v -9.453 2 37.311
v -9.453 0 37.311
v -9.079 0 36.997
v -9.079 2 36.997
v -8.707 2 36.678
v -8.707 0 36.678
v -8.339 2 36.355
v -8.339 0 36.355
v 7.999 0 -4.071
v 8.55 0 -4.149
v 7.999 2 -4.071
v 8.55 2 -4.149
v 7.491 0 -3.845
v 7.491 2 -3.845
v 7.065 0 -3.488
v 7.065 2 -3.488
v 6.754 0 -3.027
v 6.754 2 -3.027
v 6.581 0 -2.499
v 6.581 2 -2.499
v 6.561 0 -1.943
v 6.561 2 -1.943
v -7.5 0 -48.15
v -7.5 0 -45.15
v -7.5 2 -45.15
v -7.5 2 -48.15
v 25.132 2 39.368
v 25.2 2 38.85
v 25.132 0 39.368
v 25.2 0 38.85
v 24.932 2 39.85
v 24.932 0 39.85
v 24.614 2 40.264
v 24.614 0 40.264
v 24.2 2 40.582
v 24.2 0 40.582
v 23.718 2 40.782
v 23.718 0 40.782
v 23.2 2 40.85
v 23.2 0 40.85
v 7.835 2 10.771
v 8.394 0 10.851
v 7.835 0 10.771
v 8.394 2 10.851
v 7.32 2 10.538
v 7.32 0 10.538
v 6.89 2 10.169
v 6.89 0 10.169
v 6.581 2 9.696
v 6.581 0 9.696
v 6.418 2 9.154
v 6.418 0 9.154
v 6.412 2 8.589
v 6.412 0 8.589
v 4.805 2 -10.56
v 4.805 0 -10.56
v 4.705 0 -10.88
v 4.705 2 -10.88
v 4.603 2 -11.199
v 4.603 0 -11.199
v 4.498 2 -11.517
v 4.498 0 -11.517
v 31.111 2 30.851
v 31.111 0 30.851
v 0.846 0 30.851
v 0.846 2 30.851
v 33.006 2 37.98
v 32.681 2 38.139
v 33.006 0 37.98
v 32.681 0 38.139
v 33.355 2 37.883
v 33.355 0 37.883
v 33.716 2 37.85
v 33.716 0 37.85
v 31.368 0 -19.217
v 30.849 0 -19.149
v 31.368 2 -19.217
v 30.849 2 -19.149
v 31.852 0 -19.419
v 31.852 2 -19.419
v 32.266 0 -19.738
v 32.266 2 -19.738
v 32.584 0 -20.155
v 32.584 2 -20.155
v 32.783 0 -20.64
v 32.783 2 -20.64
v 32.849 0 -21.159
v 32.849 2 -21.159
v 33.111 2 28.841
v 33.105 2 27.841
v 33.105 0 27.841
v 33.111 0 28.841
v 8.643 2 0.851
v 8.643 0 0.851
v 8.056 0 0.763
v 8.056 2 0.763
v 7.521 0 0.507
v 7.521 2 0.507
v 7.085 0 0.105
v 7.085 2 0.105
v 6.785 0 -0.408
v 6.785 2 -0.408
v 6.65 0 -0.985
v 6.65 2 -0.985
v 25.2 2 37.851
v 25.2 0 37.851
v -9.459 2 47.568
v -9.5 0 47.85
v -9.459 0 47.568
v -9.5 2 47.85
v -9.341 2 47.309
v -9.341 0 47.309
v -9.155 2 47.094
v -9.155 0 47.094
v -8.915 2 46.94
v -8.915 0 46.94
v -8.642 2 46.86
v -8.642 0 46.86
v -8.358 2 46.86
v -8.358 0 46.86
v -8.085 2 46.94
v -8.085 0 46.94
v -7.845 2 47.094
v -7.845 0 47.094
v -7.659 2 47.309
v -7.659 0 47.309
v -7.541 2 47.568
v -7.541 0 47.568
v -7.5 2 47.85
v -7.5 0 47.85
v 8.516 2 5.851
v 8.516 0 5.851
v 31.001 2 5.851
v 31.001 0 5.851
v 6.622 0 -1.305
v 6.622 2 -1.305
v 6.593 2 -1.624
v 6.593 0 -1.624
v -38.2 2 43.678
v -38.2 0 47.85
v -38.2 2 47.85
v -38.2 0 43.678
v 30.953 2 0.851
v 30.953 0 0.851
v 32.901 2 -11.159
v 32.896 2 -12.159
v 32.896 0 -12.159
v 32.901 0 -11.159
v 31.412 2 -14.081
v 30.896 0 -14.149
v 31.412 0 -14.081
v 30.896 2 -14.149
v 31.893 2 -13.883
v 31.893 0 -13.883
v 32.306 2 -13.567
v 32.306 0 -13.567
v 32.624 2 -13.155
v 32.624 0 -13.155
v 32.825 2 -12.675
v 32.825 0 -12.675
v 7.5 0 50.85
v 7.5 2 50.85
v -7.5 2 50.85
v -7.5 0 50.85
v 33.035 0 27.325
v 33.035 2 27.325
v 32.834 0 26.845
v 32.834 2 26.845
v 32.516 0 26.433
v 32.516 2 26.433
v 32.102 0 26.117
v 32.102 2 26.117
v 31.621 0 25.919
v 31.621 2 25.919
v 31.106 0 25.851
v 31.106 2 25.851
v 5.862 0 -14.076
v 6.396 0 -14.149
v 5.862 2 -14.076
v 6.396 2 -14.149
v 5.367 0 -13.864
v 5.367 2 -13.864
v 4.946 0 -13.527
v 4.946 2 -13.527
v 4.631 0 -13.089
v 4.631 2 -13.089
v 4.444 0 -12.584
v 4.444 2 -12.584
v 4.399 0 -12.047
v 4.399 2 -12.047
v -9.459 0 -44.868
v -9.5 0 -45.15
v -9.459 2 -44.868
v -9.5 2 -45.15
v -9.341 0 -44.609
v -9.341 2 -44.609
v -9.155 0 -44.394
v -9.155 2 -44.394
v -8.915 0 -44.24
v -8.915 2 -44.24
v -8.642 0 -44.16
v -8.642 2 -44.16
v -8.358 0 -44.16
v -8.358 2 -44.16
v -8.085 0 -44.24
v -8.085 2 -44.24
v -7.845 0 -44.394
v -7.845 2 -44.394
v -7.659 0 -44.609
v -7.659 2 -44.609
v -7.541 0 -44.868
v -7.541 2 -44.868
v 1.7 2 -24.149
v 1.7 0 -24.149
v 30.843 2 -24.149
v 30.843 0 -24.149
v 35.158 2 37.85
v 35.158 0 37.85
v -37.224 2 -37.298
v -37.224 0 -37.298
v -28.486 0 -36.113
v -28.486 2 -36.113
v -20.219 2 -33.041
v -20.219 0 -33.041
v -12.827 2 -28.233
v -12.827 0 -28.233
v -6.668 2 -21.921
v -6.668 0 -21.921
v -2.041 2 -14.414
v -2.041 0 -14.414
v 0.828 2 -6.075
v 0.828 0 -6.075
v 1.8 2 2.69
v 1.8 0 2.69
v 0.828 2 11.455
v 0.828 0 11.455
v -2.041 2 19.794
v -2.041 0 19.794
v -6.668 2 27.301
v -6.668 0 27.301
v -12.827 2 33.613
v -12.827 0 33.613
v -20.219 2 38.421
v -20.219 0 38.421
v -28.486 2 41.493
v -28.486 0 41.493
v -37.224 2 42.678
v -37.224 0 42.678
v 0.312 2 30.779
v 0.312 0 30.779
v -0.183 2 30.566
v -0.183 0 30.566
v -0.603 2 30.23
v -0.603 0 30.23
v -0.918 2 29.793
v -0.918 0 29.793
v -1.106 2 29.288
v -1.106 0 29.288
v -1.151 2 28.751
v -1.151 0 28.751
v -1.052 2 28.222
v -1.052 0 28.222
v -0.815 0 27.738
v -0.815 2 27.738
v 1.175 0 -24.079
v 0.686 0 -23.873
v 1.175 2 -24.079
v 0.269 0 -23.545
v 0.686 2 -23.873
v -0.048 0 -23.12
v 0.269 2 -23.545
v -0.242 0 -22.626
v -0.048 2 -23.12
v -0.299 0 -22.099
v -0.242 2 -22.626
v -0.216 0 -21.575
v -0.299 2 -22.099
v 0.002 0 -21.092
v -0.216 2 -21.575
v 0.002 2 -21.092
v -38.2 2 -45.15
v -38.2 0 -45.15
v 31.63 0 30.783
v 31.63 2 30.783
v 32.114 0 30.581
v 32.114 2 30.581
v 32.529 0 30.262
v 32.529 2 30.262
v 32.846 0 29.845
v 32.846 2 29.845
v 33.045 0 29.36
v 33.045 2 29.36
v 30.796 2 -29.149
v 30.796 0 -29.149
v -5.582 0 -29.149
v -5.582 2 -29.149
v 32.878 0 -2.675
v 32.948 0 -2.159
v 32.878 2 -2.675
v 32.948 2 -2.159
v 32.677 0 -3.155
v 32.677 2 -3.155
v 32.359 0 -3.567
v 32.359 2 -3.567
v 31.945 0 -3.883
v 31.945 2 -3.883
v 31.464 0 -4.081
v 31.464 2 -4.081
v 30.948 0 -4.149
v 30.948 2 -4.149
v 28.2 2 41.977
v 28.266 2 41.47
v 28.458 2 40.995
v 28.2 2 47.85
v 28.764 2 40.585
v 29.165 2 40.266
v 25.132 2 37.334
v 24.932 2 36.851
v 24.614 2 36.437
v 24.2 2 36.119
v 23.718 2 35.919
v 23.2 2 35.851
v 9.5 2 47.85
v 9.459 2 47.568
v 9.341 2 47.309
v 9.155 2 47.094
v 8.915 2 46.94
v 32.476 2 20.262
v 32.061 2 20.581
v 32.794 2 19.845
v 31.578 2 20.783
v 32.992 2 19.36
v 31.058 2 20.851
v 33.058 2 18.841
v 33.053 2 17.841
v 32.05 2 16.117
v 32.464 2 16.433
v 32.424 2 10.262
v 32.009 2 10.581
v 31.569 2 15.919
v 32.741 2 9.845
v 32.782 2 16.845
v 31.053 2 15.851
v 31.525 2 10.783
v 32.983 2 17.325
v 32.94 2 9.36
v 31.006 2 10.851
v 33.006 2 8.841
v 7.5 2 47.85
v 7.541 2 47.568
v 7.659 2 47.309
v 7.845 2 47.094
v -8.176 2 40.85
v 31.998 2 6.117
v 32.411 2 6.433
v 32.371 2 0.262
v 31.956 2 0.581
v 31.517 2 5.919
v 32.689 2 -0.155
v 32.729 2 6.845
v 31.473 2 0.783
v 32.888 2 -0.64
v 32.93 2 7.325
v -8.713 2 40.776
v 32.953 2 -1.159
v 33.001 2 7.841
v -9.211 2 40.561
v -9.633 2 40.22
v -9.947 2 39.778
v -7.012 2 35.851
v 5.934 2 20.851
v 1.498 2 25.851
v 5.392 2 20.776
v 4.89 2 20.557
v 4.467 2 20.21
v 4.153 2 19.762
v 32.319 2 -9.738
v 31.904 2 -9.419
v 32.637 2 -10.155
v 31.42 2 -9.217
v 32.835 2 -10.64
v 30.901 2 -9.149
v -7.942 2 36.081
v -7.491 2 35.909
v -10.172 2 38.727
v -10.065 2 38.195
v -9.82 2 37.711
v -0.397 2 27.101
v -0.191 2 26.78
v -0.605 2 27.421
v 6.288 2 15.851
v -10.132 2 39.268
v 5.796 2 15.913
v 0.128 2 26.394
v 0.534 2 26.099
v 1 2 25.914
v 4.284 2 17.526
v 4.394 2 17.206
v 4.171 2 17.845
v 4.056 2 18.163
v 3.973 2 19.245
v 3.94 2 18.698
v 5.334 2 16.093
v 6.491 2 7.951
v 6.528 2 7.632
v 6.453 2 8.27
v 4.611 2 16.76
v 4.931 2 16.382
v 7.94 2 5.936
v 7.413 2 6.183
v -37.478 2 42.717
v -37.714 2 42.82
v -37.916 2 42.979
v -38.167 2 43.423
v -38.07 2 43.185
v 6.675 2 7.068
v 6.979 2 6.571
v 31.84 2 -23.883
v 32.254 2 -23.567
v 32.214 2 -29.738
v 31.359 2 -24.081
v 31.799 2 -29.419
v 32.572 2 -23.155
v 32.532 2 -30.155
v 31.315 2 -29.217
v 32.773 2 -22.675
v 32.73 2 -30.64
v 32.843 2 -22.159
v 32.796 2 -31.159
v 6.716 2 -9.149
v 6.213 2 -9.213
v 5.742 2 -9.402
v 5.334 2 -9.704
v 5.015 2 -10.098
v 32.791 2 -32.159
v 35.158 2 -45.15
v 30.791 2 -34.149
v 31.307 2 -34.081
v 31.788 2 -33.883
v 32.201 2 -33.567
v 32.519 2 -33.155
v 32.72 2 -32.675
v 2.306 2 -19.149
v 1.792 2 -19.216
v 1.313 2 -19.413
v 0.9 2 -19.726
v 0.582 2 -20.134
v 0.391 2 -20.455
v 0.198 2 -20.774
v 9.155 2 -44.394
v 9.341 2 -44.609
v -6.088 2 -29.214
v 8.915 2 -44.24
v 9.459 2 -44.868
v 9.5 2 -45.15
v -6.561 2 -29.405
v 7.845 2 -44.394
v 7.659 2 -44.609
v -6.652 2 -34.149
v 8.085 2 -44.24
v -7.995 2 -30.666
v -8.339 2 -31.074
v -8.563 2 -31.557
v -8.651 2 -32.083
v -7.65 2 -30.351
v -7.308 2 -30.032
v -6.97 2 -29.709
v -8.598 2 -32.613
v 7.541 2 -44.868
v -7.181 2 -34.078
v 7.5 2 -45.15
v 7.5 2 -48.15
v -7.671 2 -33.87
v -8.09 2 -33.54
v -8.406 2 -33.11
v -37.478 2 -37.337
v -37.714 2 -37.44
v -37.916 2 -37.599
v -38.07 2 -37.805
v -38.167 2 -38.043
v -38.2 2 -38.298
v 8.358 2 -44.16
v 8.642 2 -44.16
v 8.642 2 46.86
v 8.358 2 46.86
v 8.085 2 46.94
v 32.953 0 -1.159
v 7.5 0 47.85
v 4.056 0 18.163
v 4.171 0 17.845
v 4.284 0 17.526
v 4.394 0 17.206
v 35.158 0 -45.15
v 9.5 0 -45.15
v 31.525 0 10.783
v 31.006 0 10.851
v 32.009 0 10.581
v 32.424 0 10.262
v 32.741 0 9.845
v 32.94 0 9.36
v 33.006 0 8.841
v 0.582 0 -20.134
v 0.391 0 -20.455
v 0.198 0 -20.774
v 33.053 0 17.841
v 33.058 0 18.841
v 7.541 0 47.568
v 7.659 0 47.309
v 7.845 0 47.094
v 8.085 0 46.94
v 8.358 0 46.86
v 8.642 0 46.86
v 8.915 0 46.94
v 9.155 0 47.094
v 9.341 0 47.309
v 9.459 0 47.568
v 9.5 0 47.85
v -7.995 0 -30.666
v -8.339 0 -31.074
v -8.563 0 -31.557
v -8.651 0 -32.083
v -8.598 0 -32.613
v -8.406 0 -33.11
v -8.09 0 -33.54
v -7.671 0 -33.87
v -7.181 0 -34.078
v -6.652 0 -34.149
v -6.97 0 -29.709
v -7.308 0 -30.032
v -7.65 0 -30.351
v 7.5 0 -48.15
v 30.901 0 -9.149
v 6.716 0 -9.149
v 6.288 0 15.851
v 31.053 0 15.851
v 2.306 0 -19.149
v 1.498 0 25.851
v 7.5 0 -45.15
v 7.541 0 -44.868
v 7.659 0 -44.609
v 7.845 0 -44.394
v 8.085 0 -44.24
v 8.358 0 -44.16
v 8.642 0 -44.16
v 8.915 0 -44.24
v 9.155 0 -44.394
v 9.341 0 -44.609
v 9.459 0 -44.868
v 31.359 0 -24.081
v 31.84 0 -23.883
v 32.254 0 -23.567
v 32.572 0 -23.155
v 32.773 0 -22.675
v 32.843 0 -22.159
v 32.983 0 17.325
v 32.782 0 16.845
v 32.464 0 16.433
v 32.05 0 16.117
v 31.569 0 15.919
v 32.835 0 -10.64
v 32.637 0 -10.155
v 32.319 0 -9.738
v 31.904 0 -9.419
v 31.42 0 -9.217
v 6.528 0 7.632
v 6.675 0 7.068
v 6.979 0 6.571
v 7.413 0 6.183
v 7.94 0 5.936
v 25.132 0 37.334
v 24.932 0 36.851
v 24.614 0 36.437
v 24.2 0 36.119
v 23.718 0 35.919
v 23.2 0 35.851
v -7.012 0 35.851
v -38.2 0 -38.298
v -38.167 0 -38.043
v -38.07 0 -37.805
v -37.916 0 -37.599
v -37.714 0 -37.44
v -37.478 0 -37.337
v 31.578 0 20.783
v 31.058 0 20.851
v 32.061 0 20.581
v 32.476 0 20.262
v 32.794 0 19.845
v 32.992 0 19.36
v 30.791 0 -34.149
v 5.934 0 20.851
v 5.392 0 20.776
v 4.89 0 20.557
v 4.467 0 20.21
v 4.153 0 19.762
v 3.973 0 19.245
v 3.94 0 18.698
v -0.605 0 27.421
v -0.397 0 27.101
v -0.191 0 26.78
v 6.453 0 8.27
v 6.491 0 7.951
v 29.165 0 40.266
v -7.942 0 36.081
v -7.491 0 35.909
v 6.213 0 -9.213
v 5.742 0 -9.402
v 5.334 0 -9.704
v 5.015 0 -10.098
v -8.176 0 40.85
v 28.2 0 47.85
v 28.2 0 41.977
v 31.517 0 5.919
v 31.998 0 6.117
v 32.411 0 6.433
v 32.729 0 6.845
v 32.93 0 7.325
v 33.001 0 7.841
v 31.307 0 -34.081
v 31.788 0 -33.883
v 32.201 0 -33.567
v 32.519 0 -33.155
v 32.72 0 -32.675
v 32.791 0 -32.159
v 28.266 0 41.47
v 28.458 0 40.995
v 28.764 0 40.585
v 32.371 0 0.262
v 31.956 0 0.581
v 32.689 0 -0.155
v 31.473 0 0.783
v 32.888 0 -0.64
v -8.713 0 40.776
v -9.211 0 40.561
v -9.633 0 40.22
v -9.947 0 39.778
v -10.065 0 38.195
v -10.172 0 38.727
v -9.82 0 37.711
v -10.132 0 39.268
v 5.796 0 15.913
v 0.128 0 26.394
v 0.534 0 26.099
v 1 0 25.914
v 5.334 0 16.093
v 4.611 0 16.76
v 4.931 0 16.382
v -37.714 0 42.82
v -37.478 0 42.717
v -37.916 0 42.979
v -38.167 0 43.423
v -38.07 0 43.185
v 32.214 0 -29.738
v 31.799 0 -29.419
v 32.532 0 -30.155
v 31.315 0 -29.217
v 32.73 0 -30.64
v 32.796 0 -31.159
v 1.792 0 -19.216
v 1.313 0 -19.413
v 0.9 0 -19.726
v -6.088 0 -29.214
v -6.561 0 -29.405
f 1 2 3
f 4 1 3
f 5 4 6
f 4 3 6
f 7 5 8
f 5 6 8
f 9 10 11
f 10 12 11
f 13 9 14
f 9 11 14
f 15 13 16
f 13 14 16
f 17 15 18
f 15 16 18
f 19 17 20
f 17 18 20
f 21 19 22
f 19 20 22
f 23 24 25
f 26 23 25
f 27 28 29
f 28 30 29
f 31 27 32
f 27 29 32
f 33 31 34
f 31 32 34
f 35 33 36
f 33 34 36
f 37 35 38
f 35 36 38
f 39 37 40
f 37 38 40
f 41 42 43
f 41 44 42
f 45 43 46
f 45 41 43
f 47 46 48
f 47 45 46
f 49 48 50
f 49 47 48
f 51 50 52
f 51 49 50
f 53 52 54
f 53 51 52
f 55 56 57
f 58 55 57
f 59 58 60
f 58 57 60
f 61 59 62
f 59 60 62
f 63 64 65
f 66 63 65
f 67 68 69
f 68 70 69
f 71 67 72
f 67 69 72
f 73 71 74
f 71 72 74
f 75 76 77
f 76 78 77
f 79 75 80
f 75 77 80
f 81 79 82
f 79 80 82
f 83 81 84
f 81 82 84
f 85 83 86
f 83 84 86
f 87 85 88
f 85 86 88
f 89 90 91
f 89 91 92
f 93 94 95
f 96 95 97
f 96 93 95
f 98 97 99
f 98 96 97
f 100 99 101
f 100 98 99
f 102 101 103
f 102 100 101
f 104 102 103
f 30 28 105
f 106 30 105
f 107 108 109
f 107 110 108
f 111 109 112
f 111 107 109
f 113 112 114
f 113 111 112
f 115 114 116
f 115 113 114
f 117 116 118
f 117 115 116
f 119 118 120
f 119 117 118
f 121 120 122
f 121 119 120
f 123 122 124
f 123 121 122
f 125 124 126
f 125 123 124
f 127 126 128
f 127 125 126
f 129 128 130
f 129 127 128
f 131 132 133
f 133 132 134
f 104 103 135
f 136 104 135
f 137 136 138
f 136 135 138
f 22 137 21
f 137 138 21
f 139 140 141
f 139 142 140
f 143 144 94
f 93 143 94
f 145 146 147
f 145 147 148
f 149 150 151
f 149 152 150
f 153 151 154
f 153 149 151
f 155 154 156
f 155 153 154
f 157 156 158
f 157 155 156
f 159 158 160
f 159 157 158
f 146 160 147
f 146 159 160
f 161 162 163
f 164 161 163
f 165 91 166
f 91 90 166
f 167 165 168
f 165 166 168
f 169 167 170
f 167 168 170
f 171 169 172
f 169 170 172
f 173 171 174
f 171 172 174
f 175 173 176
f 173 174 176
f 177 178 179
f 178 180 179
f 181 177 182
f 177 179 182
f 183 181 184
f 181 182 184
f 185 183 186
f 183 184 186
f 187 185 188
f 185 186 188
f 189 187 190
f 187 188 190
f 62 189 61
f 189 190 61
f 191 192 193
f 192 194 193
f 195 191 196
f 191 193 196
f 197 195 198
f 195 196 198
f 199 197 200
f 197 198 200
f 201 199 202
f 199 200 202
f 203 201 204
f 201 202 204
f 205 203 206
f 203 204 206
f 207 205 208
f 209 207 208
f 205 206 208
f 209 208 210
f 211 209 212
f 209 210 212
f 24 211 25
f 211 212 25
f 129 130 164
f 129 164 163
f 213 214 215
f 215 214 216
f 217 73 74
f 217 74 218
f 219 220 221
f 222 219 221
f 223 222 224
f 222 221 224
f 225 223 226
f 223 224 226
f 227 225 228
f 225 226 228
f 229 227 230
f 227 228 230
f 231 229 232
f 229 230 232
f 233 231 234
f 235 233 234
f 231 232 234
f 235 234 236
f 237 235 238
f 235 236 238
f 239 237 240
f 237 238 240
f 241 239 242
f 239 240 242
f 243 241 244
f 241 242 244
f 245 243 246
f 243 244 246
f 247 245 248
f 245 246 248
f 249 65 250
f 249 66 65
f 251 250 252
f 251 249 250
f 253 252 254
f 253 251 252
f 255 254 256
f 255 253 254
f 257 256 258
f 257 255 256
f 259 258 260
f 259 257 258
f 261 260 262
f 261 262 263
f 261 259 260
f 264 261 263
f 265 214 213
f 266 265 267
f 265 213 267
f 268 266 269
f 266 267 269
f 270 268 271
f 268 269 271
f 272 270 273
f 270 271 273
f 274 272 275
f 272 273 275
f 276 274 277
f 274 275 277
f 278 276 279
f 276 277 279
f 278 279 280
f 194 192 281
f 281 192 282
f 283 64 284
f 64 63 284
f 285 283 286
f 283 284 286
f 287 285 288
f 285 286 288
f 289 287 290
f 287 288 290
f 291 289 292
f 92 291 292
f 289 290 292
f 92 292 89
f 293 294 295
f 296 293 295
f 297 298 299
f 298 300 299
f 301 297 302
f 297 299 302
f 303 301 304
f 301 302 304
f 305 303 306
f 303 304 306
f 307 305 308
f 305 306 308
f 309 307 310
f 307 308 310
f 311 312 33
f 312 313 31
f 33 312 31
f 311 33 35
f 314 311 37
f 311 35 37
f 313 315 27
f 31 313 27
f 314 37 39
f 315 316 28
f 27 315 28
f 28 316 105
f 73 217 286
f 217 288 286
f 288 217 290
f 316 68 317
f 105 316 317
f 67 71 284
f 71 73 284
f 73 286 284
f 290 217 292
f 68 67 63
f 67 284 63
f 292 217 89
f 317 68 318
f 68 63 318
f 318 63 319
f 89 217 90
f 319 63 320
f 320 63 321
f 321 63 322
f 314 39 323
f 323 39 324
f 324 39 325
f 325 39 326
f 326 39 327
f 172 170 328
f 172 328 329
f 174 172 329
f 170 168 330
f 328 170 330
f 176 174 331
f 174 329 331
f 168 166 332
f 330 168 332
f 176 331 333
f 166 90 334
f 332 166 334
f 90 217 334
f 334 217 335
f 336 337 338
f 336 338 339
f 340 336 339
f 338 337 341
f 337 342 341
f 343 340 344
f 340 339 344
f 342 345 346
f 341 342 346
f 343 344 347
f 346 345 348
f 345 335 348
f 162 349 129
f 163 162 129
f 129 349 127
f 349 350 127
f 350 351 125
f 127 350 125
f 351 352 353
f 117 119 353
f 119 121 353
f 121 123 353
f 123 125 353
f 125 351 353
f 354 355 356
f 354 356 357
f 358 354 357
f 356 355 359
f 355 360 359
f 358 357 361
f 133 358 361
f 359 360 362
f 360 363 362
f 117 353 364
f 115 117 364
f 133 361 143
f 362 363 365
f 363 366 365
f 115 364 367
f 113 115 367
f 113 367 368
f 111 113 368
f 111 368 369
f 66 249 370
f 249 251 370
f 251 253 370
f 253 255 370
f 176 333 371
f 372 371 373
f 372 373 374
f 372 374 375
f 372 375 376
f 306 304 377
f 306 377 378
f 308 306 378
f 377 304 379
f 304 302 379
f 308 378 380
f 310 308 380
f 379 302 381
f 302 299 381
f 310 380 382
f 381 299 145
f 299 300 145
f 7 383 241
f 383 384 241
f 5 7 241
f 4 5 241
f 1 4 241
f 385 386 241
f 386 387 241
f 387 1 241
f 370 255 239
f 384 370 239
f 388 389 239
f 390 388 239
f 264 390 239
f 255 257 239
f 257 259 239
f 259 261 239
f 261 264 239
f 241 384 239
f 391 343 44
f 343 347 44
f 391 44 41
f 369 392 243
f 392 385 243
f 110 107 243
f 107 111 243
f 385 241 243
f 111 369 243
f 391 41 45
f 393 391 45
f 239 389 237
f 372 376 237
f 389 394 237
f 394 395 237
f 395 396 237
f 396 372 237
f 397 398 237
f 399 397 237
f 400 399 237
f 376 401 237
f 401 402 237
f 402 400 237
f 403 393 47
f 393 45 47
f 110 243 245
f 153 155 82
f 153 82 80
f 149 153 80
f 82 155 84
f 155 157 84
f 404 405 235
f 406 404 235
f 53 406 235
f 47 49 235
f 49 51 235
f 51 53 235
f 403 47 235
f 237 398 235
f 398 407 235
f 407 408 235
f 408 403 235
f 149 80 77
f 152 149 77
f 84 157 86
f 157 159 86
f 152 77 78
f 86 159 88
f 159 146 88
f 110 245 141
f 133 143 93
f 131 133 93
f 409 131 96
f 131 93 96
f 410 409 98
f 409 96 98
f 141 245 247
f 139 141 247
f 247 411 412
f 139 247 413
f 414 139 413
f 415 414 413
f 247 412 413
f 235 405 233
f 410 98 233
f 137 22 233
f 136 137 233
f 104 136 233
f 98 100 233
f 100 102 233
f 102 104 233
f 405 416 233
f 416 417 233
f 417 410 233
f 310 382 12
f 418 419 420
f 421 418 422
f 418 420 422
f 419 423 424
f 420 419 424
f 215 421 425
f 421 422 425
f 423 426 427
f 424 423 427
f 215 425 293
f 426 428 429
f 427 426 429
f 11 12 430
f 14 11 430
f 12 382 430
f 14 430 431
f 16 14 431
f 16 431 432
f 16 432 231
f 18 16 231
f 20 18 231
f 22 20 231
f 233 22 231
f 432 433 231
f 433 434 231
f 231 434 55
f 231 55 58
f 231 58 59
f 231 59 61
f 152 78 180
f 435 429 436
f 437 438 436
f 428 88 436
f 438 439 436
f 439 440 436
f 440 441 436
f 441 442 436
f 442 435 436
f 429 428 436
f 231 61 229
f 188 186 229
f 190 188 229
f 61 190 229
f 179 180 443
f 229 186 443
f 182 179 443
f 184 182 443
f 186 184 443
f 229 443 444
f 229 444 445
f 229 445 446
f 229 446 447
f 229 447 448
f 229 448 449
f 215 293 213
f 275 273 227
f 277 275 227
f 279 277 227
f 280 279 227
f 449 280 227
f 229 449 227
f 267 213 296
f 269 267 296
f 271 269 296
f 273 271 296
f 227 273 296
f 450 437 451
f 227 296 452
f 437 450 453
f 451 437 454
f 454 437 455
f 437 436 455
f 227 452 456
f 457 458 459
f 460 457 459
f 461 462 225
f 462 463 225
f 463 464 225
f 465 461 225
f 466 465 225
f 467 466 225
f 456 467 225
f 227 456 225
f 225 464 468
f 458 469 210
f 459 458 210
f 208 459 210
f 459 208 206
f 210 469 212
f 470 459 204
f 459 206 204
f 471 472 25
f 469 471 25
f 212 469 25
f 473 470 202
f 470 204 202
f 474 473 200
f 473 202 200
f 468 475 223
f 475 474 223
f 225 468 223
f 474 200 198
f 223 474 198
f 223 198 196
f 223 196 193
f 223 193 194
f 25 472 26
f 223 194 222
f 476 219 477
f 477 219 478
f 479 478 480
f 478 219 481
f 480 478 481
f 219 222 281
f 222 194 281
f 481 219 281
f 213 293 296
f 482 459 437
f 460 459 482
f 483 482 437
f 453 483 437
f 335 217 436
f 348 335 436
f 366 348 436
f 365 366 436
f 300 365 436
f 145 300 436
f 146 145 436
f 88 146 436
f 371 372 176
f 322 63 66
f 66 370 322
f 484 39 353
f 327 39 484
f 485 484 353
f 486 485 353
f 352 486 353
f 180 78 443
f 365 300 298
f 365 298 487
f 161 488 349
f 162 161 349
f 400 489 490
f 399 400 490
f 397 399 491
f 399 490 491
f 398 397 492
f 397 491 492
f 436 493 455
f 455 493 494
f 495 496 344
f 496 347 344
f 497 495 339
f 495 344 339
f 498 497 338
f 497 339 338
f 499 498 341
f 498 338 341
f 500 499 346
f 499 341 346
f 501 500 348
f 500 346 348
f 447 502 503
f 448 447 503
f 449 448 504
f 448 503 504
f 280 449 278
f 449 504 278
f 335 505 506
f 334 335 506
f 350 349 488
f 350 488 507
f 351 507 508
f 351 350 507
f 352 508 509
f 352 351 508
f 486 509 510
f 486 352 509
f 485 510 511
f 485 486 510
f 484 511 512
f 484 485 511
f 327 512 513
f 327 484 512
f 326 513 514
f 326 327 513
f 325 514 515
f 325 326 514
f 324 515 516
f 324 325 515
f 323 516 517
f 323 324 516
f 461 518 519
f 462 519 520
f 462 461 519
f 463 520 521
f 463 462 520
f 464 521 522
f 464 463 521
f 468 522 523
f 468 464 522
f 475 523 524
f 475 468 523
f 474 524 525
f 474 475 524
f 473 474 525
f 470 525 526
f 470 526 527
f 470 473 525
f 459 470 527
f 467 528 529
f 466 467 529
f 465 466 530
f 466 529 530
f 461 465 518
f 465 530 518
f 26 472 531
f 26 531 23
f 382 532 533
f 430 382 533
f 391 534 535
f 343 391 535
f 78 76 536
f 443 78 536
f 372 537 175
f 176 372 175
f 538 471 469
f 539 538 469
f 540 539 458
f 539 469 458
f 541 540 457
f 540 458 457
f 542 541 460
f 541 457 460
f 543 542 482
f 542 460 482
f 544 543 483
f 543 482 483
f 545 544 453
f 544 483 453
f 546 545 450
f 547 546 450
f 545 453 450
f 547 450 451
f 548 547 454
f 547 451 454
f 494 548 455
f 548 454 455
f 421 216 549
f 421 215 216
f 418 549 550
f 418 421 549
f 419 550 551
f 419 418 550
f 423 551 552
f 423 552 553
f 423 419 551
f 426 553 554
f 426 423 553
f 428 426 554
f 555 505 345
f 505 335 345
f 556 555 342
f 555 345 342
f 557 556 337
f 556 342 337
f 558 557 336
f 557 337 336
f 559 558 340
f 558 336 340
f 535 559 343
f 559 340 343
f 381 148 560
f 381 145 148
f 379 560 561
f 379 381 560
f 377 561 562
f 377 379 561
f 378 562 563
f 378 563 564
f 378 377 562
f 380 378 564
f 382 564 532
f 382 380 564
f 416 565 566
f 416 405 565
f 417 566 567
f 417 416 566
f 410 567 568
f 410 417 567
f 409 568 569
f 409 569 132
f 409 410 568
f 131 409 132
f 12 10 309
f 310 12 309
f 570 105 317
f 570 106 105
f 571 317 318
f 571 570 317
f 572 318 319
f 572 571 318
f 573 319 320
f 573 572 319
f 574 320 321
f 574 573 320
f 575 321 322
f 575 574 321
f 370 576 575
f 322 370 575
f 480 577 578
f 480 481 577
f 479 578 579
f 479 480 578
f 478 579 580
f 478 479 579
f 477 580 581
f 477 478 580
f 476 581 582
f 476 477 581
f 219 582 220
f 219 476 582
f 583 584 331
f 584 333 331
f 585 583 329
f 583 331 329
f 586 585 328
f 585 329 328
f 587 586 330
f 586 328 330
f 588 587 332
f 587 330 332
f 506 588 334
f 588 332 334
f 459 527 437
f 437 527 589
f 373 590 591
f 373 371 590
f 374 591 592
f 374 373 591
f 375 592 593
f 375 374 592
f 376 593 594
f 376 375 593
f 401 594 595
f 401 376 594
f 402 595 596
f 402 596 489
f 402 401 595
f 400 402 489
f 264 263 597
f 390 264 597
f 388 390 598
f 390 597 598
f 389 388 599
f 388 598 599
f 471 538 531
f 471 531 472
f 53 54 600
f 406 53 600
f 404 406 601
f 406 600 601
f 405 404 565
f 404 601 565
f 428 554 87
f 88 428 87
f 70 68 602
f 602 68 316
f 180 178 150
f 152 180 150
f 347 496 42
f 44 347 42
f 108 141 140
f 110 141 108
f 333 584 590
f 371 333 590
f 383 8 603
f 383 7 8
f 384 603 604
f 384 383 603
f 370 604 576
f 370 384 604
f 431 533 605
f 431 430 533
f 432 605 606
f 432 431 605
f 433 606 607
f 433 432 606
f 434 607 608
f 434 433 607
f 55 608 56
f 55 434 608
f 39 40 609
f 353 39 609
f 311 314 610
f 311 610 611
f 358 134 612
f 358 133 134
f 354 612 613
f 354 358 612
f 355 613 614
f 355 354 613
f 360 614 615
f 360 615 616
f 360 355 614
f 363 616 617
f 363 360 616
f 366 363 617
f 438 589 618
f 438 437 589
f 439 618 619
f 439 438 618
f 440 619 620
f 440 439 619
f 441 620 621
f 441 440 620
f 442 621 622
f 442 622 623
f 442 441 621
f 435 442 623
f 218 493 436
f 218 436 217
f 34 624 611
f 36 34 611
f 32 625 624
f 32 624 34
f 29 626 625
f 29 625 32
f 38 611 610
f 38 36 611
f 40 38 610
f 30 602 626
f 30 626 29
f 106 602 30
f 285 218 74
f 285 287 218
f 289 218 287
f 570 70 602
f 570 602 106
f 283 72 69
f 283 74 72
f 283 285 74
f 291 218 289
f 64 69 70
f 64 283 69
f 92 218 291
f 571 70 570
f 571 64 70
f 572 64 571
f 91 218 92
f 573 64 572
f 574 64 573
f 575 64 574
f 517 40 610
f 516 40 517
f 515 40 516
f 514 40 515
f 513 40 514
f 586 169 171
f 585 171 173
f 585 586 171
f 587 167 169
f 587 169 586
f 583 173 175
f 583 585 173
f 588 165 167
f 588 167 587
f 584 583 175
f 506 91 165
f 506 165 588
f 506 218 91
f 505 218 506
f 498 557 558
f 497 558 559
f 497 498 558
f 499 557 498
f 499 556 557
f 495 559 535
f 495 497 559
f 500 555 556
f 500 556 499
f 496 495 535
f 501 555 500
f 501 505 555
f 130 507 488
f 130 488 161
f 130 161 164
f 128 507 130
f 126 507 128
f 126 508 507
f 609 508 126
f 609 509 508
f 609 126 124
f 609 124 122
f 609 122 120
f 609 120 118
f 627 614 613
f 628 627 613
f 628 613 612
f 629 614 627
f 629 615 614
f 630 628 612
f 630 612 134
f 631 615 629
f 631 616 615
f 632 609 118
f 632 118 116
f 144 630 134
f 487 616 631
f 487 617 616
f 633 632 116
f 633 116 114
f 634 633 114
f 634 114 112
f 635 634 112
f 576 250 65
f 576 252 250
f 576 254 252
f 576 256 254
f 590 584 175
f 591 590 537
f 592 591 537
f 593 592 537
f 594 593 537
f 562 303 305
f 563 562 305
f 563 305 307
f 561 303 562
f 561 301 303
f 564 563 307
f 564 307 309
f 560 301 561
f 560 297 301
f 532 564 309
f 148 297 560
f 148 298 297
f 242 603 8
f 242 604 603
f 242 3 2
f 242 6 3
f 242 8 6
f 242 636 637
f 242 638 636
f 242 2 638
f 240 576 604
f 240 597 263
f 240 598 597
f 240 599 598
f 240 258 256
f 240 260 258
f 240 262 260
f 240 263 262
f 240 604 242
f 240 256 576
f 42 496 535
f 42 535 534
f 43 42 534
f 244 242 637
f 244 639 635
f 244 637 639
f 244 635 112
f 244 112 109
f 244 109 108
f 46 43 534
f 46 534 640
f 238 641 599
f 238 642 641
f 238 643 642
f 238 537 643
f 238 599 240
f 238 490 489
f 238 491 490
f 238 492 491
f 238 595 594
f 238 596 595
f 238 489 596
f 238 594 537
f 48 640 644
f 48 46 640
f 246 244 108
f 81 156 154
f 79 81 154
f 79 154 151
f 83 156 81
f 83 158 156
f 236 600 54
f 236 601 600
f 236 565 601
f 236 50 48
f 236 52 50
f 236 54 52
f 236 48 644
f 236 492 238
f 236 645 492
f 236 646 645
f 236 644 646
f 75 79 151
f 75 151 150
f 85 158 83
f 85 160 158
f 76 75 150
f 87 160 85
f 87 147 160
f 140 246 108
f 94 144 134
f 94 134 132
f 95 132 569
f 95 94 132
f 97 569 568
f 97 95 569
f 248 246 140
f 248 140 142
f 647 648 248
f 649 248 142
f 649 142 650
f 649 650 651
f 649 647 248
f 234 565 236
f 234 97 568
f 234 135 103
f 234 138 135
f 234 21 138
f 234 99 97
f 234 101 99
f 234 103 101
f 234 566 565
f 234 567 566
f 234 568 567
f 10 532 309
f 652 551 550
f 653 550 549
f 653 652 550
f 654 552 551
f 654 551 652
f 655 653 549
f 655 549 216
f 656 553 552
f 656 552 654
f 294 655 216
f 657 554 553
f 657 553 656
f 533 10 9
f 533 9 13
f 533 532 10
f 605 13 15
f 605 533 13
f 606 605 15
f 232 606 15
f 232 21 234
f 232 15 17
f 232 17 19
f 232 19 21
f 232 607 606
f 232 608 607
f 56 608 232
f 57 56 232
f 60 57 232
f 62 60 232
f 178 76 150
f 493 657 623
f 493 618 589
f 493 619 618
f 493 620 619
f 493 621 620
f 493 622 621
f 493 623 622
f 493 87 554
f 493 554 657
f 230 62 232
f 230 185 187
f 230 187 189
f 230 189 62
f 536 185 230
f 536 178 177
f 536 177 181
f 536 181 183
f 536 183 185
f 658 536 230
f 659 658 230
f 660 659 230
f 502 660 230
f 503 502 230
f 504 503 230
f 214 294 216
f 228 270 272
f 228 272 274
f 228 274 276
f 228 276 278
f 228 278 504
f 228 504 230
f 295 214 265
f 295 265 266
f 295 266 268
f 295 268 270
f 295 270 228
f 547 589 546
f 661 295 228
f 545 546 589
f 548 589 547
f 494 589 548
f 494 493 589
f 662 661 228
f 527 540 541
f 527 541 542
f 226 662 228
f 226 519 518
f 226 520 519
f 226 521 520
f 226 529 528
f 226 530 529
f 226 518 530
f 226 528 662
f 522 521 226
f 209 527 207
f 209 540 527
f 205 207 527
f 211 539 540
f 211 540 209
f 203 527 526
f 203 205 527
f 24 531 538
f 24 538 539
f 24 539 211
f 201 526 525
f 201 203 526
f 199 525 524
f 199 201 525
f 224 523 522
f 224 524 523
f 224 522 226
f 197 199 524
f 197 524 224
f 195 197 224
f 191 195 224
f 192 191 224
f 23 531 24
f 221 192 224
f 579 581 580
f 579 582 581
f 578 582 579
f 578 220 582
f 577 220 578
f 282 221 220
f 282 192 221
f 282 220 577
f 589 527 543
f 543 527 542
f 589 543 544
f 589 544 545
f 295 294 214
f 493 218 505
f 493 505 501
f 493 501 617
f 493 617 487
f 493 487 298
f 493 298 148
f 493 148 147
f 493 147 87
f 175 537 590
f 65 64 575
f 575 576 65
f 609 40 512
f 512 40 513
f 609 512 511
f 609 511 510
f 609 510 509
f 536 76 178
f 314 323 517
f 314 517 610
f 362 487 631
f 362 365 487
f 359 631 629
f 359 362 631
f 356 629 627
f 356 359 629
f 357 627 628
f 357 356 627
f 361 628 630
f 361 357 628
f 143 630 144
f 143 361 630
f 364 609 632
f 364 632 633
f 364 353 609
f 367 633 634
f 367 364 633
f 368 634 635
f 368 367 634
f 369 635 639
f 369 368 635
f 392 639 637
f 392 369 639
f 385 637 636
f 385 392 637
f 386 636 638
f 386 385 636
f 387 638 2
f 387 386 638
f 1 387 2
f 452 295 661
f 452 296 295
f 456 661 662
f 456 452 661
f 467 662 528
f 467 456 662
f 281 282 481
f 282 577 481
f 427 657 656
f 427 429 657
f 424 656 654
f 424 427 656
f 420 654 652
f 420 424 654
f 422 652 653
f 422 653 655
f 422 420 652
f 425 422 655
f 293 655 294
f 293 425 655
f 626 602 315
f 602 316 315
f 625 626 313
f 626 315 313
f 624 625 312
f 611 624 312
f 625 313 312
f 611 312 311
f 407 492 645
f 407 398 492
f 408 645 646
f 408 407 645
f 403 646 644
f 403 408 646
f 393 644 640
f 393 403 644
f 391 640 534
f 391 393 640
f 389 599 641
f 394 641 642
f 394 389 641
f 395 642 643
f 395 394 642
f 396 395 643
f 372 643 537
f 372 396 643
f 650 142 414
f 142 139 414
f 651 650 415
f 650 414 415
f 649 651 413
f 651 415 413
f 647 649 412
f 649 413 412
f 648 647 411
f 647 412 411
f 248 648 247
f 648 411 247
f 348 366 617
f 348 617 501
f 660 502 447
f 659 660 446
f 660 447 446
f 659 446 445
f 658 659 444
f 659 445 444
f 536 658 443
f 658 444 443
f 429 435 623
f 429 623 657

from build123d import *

# Parameters (mm, degrees)
EXTRUDE_1_DEPTH          = 2
SKETCH_3_W               = 76.4
SKETCH_3_H               = 2
EXTRUDE_2_DEPTH          = 7
CUT_EXTRUDE_1_DEPTH      = 10
EXTRUDE_4_DEPTH          = 2
PATTERN_LINEAR_2_COUNT   = 2
PATTERN_LINEAR_2_PITCH   = 32
FILLET_3_R               = 0.5
CUT_EXTRUDE_2_DEPTH      = 10
EXTRUDE_5_DEPTH          = 2
CUT_EXTRUDE_3_DEPTH      = 10
CUT_EXTRUDE_4_DEPTH      = 10
FILLET_5_R               = 2
EXTRUDE_9_DEPTH          = 2
FILLET_6_R               = 2
FILLET_7_R               = 1
SKETCH_18_W              = 76.4
SKETCH_18_H              = 2
EXTRUDE_6_DEPTH          = 2
SKETCH_19_W              = 10
SKETCH_19_H              = 10
CUT_EXTRUDE_5_DEPTH      = 3
EXTRUDE_8_DEPTH          = 2
FILLET_8_R               = 2
FILLET_9_R               = 2
SKETCH_21_W              = 3
SKETCH_21_H              = 87.342834434
CUT_EXTRUDE_6_DEPTH      = 3
CUT_EXTRUDE_7_DEPTH      = 1
CUT_EXTRUDE_7_DEPTH_BACK = 3
SKETCH_24_W              = 15
SKETCH_24_H              = 2
EXTRUDE_10_DEPTH         = 3
SKETCH_25_R              = 1
CUT_EXTRUDE_8_DEPTH      = 3


with BuildPart() as part:
    # 草图1 → 凸台-拉伸1 (new body)
    with BuildSketch(Plane(origin=(0, 0, 0), x_dir=(1, 0, 0), z_dir=(0, 1, 0))):
        with BuildLine():
            Line((-38.2, -42.69), (-38.2, -45.85))
            Line((-38.2, -45.85), (38.2, -45.85))
            Line((38.2, -45.85), (38.2, 45.85))
            Line((38.2, 45.85), (-38.2, 45.85))
            Line((-38.2, 45.85), (-38.2, 37.31))
            ThreePointArc((-38.2, 37.31), (1.8, -2.69), (-38.2, -42.69))
        make_face()
    extrude(amount=EXTRUDE_1_DEPTH)

    # 草图3 → 凸台-拉伸2 (add)
    with BuildSketch(Plane(origin=(0, 0, -45.85), x_dir=(-1, 0, 0), z_dir=(0, 0, -1))):
        with Locations((0, 1)):
            Rectangle(SKETCH_3_W, SKETCH_3_H)
    extrude(amount=EXTRUDE_2_DEPTH)

    # 草图5 → 切除-拉伸1 (cut)
    with BuildSketch(Plane(origin=(0, 2, 0), x_dir=(1, 0, 0), z_dir=(0, 1, 0))):
        Polygon((-38.2, 51.26), (38.2, 52.85), (-38.2, 52.85), align=None)
    extrude(amount=-CUT_EXTRUDE_1_DEPTH, mode=Mode.SUBTRACT)

    # 草图7 → 凸台-拉伸4 (add)
    with BuildSketch(Plane.XZ):
        Polygon((25.6, -52.587774869), (25.6, -54.754790576), (9.6, -54.754790576), (9.6, -52.254790576), align=None)
    extrude_4 = extrude(amount=-EXTRUDE_4_DEPTH)

    # 阵列(线性)2: 凸台-拉伸4 ×2
    with Locations(*[Vector(-0.999783511, 0, 0.020807013) * (i * PATTERN_LINEAR_2_PITCH) for i in range(1, PATTERN_LINEAR_2_COUNT)]):
        add(extrude_4)

    # 圆角3
    fillet_3_edges = [part.edges().sort_by_distance(p)[0] for p in [
        (25.6, 1, -54.754790576),
        (9.6, 1, -54.754790576),
        (-6.393072342, 1, -54.088966165),
        (-22.393072342, 1, -54.088966165),
    ]]
    fillet(fillet_3_edges, radius=FILLET_3_R)

    # 草图10 → 切除-拉伸2 (cut)
    with BuildSketch(Plane(origin=(0, 2, 0), x_dir=(1, 0, 0), z_dir=(0, 1, 0))):
        Polygon((-38.882265213, 53.905585721), (39.585789662, 55.538625083), (39.585789662, 48.538625083), (-38.2, 46.919784696), (-39.22769149, 52.889737929), align=None)
    extrude(amount=-CUT_EXTRUDE_2_DEPTH, mode=Mode.SUBTRACT)

    # 草图11 → 凸台-拉伸5 (add)
    with BuildSketch(Plane(origin=(0, 2, 0), x_dir=(1, 0, 0), z_dir=(0, 1, 0))):
        Polygon((-38.2, 46.919784696), (38.2, 49.509784696), (38.2, 48.509784696), align=None)
    extrude(amount=-EXTRUDE_5_DEPTH)

    # 草图13 → 切除-拉伸3 (cut)
    with BuildSketch(Plane.XZ):
        Polygon((38.2, -49.509784696), (37.7, -49.492834434), (38.2, 45.85), align=None)
    extrude(amount=-CUT_EXTRUDE_3_DEPTH, mode=Mode.SUBTRACT)

    # 草图16 → 切除-拉伸4 (cut)
    with BuildSketch(Plane.XZ):
        with BuildLine():
            ThreePointArc((-21.63159016, -39.14883119), (-26.948214114, -40.880601492), (-32.438562967, -41.939652064))
            Line((-32.438562967, -41.939652064), (32.727956442, -44.14883119))
            Line((32.727956442, -44.14883119), (32.754177605, -39.14883119))
            Line((32.754177605, -39.14883119), (-21.63159016, -39.14883119))
        make_face()
        with BuildLine():
            ThreePointArc((-6.399232266, -29.14883119), (-9.26951053, -31.777764346), (-12.35622867, -34.14883119))
            Line((-12.35622867, -34.14883119), (32.780398767, -34.14883119))
            Line((32.780398767, -34.14883119), (32.80661993, -29.14883119))
            Line((32.80661993, -29.14883119), (-6.399232266, -29.14883119))
        make_face()
        with BuildLine():
            ThreePointArc((1.145462918, -19.14883119), (-0.38438284, -21.702193399), (-2.079685213, -24.14883119))
            Line((-2.079685213, -24.14883119), (32.832841093, -24.14883119))
            Line((32.832841093, -24.14883119), (32.859062256, -19.14883119))
            Line((32.859062256, -19.14883119), (1.145462918, -19.14883119))
        make_face()
        with BuildLine():
            ThreePointArc((5.214767949, -9.14883119), (4.446089194, -11.673532869), (3.530729255, -14.14883119))
            Line((3.530729255, -14.14883119), (32.885283419, -14.14883119))
            Line((32.885283419, -14.14883119), (32.911504582, -9.14883119))
            Line((32.911504582, -9.14883119), (5.214767949, -9.14883119))
        make_face()
        with BuildLine():
            Line((32.937725745, -4.14883119), (32.963946908, 0.85116881))
            Line((32.963946908, 0.85116881), (6.762414302, 0.85116881))
            ThreePointArc((6.762414302, 0.85116881), (6.58968308, -1.65560578), (6.277301941, -4.14883119))
            Line((6.277301941, -4.14883119), (32.937725745, -4.14883119))
        make_face()
        with BuildLine():
            Line((33.016389234, 10.85116881), (6.053760559, 10.85116881))
            ThreePointArc((6.053760559, 10.85116881), (6.441352349, 8.360067057), (6.688829476, 5.85116881))
            Line((6.688829476, 5.85116881), (32.990168071, 5.85116881))
            Line((32.990168071, 5.85116881), (33.016389234, 10.85116881))
        make_face()
        with BuildLine():
            Line((33.06883156, 20.85116881), (2.97246589, 20.85116881))
            ThreePointArc((2.97246589, 20.85116881), (3.976569254, 18.378754125), (4.832355682, 15.85116881))
            Line((4.832355682, 15.85116881), (33.042610397, 15.85116881))
            Line((33.042610397, 15.85116881), (33.06883156, 20.85116881))
        make_face()
        with BuildLine():
            Line((33.121273886, 30.85116881), (-3.100875064, 30.85116881))
            ThreePointArc((-3.100875064, 30.85116881), (-1.274777634, 28.410185715), (0.381864384, 25.85116881))
            Line((0.381864384, 25.85116881), (33.095052723, 25.85116881))
            Line((33.095052723, 25.85116881), (33.121273886, 30.85116881))
        make_face()
        with BuildLine():
            Line((33.173710083, 40.85), (-14.350169812, 40.85))
            ThreePointArc((-14.350169812, 40.85), (-10.950539992, 38.501547429), (-7.780649528, 35.85116881))
            Line((-7.780649528, 35.85116881), (33.147495049, 35.85116881))
            Line((33.147495049, 35.85116881), (33.173710083, 40.85))
        make_face()
    extrude(amount=-CUT_EXTRUDE_4_DEPTH, mode=Mode.SUBTRACT)

    # 圆角5
    fillet_5_edges = [part.edges().sort_by_distance(p)[0] for p in [
        (-21.63159016, 1, -39.14883119),
        (32.754177605, 1, -39.14883119),
        (32.727956442, 1, -44.14883119),
        (-6.399232266, 1, -29.14883119),
        (32.80661993, 1, -29.14883119),
        (32.780398767, 1, -34.14883119),
        (-2.079685213, 1, -24.14883119),
        (3.530729255, 1, -14.14883119),
        (5.214767949, 1, -9.14883119),
        (32.911504582, 1, -9.14883119),
        (32.885283419, 1, -14.14883119),
        (32.937725745, 1, -4.14883119),
        (6.688829476, 1, 5.85116881),
        (33.016389234, 1, 10.85116881),
        (32.990168071, 1, 5.85116881),
        (4.832355682, 1, 15.85116881),
        (2.97246589, 1, 20.85116881),
        (0.381864384, 1, 25.85116881),
        (-3.100875064, 1, 30.85116881),
        (33.121273886, 1, 30.85116881),
        (-14.350169812, 1, 40.85),
        (33.173710083, 1, 40.85),
    ]]
    fillet(fillet_5_edges, radius=FILLET_5_R)

    # 草图23 → 凸台-拉伸9 (add)
    with BuildSketch(Plane.XZ):
        with BuildLine():
            Line((30.743661638, -39.14883119), (-21.254296123, -39.14883119))
            ThreePointArc((-21.254296123, -39.14883119), (-21.621062836, -39.182748237), (-21.975389905, -39.283349012))
            ThreePointArc((-21.975389905, -39.283349012), (-27.127035015, -40.926389654), (-32.438562967, -41.939652064))
            Line((-32.438562967, -41.939652064), (30.67101495, -44.079099797))
            ThreePointArc((30.67101495, -44.079099797), (32.125051399, -43.521859473), (32.738749569, -42.090736373))
            Line((32.738749569, -42.090736373), (32.743634136, -41.159319511))
            ThreePointArc((32.743634136, -41.159319511), (32.161578532, -39.738330684), (30.743661638, -39.14883119))
        make_face()
    extrude(amount=-EXTRUDE_9_DEPTH)

    # 圆角6
    fillet_6_edges = [part.edges().sort_by_distance(p)[0] for p in [
        (-12.35622867, 1, -34.14883119),
        (1.145462918, 1, -19.14883119),
        (32.859062256, 1, -19.14883119),
        (32.832841093, 1, -24.14883119),
        (6.277301941, 1, -4.14883119),
        (6.762414302, 1, 0.85116881),
        (32.963946908, 1, 0.85116881),
        (6.053760559, 1, 10.85116881),
        (33.06883156, 1, 20.85116881),
        (33.042610397, 1, 15.85116881),
        (33.095052723, 1, 25.85116881),
        (-7.780649528, 1, 35.85116881),
        (33.147495049, 1, 35.85116881),
    ]]
    fillet(fillet_6_edges, radius=FILLET_6_R)

    # 圆角7
    fillet_7_edges = [part.edges().sort_by_distance(p)[0] for p in [
        (-38.2, 1, 42.69),
        (-38.2, 1, -37.31),
        (-38.2, 1, -46.919784696),
    ]]
    fillet(fillet_7_edges, radius=FILLET_7_R)

    # 草图18 → 凸台-拉伸6 (add)
    with BuildSketch(Plane.XY.offset(45.85)):
        with Locations((0, 1)):
            Rectangle(SKETCH_18_W, SKETCH_18_H)
    extrude(amount=EXTRUDE_6_DEPTH)

    # 草图19 → 切除-拉伸5 (cut, through all)
    with BuildSketch(Plane(origin=(0, 2, 0), x_dir=(1, 0, 0), z_dir=(0, 1, 0))):
        with Locations((33.2, -42.85)):
            Rectangle(SKETCH_19_W, SKETCH_19_H)
    extrude(amount=-CUT_EXTRUDE_5_DEPTH, mode=Mode.SUBTRACT)

    # 草图20 → 凸台-拉伸8 (add)
    with BuildSketch(Plane(origin=(0, 2, 0), x_dir=(1, 0, 0), z_dir=(0, 1, 0))):
        Polygon((25.2, -35.85116881), (33.157977385, -35.85116881), (33.157977385, -37.85), (28.2, -40.85), (25.2, -40.85), align=None)
    extrude(amount=-EXTRUDE_8_DEPTH)

    # 圆角8
    fillet_8_edges = [part.edges().sort_by_distance(p)[0] for p in [
        (25.2, 1, 40.85),
        (25.2, 1, 35.85116881),
    ]]
    fillet(fillet_8_edges, radius=FILLET_8_R)

    # 圆角9
    fillet_9_edges = [part.edges().sort_by_distance(p)[0] for p in [
        (33.157977385, 1, 37.85),
        (28.2, 1, 40.85),
    ]]
    fillet(fillet_9_edges, radius=FILLET_9_R)

    # 草图21 → 切除-拉伸6 (cut, through all)
    with BuildSketch(Plane.XZ):
        with Locations((36.658046139, -5.821417217)):
            Rectangle(SKETCH_21_W, SKETCH_21_H)
    extrude(amount=-CUT_EXTRUDE_6_DEPTH, mode=Mode.SUBTRACT)

    # 草图22 → 切除-拉伸7 (cut, two sides)
    with BuildSketch(Plane.XZ) as cut_extrude_7_sk:
        Polygon((-290.579437235, -45.15), (-39.244125604, -45.15), (60.755874396, -45.15), (60.755874396, -51.15), (-39.244125604, -51.15), (-39.244125604, -47.15), (-39.244125604, 204.185311631), (314.77499341, -152.673510404), (63.439681778, -402.008822036), align=None)
    extrude(amount=CUT_EXTRUDE_7_DEPTH, mode=Mode.SUBTRACT)
    extrude(cut_extrude_7_sk.sketch, amount=-CUT_EXTRUDE_7_DEPTH_BACK, mode=Mode.SUBTRACT)

    # 草图24 → 凸台-拉伸10 (add)
    with BuildSketch(Plane(origin=(0, 0, -45.15), x_dir=(-1, 0, 0), z_dir=(0, 0, -1))):
        with Locations((0, 1)):
            Rectangle(SKETCH_24_W, SKETCH_24_H)
    extrude_10 = extrude(amount=EXTRUDE_10_DEPTH)

    # 草图25 → 切除-拉伸8 (cut, through all)
    with BuildSketch(Plane(origin=(0, 2, 0), x_dir=(1, 0, 0), z_dir=(0, 1, 0))):
        with Locations((-8.5, 45.15)):
            Circle(SKETCH_25_R)
        with Locations((8.5, 45.15)):
            Circle(SKETCH_25_R)
    cut_extrude_8 = extrude(amount=-CUT_EXTRUDE_8_DEPTH, mode=Mode.SUBTRACT)

    # 镜向1: 凸台-拉伸10, 切除-拉伸8 across plane
    add(extrude_10.mirror(Plane.XY.offset(1.35)))
    add(cut_extrude_8.mirror(Plane.XY.offset(1.35)), mode=Mode.SUBTRACT)


solid = part.part
